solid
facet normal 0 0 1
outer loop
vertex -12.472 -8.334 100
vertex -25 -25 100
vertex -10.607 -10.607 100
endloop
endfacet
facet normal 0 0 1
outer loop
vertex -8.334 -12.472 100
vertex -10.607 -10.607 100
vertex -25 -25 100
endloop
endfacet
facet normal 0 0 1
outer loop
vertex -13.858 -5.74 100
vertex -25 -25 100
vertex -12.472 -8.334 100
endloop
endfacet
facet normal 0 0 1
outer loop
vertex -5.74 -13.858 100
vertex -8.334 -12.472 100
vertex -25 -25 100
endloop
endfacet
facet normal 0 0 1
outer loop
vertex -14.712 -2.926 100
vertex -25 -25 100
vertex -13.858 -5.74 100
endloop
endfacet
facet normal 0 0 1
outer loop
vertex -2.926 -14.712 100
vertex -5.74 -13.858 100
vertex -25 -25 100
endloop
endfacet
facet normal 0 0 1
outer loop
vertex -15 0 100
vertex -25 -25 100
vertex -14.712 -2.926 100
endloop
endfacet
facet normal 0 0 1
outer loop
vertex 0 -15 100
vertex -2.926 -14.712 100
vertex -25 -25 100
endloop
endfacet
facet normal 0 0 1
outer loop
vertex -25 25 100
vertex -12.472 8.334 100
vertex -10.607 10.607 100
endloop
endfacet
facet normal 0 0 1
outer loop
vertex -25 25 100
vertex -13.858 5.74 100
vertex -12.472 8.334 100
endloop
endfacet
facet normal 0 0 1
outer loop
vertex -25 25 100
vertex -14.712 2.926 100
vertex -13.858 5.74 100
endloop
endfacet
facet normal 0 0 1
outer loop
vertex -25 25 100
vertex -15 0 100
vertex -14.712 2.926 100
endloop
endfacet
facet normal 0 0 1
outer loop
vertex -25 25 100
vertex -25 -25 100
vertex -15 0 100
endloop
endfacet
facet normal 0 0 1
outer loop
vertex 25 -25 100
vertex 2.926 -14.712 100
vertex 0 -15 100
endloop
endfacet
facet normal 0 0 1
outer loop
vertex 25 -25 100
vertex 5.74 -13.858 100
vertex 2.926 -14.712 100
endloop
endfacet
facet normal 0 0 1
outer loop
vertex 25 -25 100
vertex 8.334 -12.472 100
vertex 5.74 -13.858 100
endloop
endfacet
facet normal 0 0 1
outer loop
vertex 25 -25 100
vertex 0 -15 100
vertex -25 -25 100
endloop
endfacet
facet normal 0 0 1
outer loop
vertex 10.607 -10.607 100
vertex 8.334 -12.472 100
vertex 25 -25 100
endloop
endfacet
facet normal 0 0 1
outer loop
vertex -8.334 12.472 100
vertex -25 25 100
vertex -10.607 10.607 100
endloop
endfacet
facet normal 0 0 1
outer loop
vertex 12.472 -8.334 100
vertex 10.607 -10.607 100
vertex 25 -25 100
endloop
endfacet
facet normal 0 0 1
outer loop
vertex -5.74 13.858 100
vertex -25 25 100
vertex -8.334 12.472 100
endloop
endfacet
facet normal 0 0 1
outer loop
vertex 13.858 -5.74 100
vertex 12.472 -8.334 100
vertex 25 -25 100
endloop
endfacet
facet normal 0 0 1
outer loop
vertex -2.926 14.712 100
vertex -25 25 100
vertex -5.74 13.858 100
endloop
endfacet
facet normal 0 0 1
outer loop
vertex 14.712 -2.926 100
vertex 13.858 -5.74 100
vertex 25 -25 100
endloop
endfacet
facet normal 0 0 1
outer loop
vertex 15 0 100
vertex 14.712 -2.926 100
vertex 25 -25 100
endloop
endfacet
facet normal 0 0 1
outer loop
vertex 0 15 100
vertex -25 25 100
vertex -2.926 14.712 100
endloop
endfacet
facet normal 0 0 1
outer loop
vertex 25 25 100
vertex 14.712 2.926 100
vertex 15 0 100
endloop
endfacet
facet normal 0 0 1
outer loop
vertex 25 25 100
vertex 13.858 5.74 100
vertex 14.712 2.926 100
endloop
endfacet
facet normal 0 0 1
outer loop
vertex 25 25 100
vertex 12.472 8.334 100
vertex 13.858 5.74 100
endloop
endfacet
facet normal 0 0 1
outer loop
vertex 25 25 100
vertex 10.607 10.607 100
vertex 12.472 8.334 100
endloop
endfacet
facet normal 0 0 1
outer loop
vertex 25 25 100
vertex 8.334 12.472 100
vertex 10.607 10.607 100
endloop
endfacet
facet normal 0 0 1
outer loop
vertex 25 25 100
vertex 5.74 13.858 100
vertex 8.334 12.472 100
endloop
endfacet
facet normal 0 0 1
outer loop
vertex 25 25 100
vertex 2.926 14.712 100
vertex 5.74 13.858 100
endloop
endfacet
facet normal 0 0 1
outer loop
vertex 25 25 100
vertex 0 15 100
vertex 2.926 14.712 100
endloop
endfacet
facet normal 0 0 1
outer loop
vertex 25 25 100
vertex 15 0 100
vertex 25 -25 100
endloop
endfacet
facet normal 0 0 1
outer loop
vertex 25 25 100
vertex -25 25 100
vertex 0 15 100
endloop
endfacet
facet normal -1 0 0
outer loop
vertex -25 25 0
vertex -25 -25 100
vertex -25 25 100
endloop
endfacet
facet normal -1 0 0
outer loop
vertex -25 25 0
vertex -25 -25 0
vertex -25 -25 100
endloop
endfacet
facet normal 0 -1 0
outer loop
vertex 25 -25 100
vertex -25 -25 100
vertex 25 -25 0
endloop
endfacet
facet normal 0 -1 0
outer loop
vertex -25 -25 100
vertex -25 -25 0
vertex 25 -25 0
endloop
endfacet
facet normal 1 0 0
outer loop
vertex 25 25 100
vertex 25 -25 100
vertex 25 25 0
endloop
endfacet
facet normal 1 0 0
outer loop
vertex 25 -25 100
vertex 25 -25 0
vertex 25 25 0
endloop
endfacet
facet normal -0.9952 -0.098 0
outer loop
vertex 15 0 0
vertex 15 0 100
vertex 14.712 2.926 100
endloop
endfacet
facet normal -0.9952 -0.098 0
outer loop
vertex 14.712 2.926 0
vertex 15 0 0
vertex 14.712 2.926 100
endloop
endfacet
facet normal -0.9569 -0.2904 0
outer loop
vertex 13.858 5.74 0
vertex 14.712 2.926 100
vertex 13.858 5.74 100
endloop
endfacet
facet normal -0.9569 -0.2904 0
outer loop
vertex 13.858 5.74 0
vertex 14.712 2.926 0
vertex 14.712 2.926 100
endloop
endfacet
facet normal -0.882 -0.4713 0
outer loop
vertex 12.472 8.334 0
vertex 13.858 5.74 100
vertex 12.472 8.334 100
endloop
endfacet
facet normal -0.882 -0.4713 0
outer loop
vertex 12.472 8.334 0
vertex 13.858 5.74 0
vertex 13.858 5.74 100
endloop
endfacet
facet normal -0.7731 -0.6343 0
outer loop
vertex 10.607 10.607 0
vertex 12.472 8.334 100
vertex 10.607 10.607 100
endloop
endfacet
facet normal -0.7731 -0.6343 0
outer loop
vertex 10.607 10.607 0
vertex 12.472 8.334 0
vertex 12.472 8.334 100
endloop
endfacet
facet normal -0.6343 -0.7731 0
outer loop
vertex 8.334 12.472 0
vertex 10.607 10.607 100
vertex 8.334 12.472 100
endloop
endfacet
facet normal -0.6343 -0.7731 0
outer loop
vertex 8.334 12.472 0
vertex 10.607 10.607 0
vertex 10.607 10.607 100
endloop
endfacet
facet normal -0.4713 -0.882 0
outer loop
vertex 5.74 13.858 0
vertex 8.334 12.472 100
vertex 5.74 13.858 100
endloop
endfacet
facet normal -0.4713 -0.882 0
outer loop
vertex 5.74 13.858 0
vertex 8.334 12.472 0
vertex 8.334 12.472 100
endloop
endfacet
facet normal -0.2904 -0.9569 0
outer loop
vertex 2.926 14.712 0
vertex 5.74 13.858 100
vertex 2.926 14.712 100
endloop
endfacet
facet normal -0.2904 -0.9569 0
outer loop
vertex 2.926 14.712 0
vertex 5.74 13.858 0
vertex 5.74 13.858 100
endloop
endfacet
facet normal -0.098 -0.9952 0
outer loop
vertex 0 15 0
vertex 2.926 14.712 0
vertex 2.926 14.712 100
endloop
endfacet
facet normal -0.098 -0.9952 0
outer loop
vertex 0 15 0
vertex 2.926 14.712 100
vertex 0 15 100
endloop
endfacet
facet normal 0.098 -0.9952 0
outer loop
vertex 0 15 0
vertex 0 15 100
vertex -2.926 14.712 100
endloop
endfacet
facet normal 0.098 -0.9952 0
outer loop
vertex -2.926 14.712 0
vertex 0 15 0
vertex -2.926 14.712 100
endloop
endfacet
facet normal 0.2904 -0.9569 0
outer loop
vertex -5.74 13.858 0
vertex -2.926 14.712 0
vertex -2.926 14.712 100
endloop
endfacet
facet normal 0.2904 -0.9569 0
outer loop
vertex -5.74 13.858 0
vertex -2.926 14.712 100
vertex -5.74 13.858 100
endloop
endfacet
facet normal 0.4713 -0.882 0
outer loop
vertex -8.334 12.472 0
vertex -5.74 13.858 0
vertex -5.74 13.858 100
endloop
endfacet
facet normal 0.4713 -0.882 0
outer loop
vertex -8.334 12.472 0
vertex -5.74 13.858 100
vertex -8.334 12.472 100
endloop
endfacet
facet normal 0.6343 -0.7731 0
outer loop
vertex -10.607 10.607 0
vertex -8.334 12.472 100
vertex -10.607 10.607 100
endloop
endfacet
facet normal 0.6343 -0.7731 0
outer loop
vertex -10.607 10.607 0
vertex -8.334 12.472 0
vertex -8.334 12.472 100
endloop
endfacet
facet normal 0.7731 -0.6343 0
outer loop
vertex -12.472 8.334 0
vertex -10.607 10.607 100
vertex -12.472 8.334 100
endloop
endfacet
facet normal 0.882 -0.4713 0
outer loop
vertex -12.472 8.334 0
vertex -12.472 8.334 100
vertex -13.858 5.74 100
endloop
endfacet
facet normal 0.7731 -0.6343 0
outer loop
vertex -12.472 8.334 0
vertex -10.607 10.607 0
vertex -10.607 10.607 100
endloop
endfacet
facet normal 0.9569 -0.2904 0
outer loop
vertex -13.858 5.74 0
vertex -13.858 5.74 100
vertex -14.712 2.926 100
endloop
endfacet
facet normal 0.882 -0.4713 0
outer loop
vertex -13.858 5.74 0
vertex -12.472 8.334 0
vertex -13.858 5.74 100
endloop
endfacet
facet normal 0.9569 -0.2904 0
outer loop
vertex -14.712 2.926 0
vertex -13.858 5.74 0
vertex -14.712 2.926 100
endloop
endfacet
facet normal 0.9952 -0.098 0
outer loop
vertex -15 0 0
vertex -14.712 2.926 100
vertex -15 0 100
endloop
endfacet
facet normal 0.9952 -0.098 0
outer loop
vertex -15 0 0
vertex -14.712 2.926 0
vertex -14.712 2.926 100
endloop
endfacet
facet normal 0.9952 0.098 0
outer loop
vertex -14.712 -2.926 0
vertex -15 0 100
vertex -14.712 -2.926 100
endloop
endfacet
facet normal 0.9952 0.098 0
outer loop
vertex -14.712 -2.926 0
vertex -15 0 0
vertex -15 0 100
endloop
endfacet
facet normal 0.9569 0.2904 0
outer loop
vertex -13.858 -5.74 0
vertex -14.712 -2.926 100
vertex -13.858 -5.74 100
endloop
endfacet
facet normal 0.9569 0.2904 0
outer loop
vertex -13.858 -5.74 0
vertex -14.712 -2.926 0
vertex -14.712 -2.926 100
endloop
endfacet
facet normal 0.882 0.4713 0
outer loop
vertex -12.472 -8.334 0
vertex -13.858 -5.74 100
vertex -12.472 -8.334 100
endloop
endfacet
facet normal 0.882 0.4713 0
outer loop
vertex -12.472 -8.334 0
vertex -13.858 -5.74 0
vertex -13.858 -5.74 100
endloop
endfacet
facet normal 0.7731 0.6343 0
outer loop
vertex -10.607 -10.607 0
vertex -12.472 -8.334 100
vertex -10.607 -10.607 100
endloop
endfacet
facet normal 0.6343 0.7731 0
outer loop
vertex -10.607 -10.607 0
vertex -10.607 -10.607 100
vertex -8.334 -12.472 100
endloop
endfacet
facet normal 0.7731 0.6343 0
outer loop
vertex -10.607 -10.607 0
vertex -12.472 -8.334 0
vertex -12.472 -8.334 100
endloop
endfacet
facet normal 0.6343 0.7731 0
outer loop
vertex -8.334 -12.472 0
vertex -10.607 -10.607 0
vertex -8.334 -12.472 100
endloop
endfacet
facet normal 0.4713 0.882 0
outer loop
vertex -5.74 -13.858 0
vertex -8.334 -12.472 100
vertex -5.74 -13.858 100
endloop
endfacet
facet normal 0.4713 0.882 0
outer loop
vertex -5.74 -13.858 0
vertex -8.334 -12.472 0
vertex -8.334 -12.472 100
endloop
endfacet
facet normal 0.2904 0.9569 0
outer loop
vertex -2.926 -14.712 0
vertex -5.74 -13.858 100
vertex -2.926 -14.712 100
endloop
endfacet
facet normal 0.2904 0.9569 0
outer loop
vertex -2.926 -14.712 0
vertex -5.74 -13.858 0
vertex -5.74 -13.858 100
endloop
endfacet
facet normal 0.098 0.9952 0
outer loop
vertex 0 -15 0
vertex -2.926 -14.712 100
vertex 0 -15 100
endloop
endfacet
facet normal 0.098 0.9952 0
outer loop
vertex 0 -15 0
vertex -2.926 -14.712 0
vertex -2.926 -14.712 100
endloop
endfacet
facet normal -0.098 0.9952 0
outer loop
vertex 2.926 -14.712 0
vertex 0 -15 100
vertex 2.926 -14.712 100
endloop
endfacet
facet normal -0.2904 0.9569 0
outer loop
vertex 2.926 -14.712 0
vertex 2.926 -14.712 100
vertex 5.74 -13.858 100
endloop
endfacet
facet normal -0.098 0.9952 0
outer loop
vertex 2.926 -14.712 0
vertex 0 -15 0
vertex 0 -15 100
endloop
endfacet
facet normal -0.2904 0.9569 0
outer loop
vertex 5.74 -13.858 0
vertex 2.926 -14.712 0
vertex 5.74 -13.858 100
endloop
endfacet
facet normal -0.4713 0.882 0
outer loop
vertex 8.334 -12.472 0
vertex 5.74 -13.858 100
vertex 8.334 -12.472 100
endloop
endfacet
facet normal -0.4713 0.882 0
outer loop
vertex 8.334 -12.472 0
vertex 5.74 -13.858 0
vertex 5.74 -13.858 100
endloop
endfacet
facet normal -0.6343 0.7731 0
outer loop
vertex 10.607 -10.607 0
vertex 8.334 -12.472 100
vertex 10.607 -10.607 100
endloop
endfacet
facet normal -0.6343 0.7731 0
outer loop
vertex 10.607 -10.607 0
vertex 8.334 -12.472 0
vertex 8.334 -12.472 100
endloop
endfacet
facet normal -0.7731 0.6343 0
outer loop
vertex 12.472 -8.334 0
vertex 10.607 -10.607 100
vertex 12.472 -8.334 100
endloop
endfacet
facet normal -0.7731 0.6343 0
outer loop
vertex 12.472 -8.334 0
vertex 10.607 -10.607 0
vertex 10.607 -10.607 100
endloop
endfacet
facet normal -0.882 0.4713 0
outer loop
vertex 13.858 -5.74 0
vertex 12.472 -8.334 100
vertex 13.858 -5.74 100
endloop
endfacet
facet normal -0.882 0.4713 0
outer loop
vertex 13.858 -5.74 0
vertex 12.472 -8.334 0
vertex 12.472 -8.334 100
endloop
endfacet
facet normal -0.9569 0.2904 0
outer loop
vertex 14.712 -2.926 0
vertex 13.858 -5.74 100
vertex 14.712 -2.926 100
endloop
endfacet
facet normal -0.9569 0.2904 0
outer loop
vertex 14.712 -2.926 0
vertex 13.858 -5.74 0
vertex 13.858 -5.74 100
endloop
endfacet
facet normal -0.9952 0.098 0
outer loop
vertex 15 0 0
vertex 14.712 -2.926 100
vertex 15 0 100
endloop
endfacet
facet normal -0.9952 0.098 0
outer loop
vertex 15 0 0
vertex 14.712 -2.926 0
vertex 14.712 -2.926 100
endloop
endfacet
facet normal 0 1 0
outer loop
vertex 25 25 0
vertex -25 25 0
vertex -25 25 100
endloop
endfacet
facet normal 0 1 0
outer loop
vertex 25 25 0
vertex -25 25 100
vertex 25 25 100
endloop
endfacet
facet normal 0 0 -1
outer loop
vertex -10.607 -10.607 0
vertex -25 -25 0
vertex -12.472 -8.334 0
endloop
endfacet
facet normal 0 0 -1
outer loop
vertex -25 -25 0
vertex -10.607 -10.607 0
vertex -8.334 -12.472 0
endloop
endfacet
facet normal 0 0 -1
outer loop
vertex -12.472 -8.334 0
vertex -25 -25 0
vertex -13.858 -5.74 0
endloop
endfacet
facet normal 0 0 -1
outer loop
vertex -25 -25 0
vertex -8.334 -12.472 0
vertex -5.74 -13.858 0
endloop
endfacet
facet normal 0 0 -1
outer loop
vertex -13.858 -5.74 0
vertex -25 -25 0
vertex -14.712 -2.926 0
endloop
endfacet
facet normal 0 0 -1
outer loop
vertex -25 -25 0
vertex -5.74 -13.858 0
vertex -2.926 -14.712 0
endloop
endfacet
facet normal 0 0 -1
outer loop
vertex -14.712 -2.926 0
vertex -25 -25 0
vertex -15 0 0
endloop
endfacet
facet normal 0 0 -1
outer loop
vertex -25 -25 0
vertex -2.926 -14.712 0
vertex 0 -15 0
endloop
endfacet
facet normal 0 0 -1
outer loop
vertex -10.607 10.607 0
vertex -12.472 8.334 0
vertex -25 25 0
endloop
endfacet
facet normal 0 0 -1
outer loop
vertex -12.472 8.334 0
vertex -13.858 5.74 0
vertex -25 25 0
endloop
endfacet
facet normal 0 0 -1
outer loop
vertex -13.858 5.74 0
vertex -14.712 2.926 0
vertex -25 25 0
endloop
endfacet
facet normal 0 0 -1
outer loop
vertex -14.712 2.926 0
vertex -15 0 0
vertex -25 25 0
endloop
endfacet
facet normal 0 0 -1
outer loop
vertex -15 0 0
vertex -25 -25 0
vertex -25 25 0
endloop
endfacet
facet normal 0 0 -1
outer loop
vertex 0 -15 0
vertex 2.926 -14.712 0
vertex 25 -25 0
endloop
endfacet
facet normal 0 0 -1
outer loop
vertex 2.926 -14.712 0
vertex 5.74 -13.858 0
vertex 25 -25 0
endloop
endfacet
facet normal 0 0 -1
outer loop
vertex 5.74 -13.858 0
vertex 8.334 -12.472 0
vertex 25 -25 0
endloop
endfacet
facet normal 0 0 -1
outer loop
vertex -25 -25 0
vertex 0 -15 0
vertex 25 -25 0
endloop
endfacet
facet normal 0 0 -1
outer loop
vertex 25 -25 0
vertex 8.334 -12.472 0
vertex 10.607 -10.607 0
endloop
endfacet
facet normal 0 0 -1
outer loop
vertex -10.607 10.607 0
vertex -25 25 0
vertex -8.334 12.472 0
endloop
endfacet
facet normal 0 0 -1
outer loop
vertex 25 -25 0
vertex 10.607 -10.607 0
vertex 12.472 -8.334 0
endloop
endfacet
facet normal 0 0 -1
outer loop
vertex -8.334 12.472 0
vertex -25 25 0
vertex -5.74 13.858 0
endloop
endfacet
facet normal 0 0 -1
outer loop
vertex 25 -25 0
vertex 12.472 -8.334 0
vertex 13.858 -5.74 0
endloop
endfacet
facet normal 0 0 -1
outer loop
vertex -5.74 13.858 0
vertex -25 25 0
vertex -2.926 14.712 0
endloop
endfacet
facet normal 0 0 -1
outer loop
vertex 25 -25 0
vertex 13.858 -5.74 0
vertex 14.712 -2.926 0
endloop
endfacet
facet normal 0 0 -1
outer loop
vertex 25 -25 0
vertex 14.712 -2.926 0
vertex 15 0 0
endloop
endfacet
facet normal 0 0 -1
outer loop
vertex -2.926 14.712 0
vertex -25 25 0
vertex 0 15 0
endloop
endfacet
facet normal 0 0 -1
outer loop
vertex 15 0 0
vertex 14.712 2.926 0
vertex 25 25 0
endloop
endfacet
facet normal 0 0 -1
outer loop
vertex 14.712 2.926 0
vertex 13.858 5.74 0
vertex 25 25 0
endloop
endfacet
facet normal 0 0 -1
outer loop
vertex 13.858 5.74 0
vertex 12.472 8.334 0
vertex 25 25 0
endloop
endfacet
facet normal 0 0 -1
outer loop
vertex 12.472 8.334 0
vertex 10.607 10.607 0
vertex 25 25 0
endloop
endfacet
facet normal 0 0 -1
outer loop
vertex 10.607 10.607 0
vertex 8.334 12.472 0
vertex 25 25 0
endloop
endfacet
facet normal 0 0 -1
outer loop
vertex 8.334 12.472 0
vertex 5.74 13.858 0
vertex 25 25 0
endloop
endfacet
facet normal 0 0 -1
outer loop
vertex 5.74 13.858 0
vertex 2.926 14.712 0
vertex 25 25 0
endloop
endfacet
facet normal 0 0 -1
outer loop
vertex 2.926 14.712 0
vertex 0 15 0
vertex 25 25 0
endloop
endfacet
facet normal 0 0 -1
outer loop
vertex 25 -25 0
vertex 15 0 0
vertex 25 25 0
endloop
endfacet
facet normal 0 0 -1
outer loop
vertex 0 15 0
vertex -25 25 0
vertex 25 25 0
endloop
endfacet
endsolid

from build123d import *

# Parameters (mm, degrees)
F0_W     = 50
F0_H     = 50
F1_DEPTH = 50
F2_R     = 15
F3_DEPTH = 50
F4_DEPTH = 50


with BuildPart() as f1:
    # F0 (on Top) → F1 (new body)
    with BuildSketch(Plane.XY):
        Rectangle(F0_W, F0_H)
    extrude(amount=F1_DEPTH)

    # F2 (on face) → F3 (cut)
    with BuildSketch(Plane.XY.offset(50)):
        Circle(F2_R)
    extrude(amount=-F3_DEPTH, mode=Mode.SUBTRACT)

    # F4 (add): a face of the model
    f4_faces = [f1.faces().sort_by_distance(p)[0] for p in [
        (0, 24.2928932188, 50),
    ]]
    extrude(f4_faces, amount=F4_DEPTH)


solid = f1.part
